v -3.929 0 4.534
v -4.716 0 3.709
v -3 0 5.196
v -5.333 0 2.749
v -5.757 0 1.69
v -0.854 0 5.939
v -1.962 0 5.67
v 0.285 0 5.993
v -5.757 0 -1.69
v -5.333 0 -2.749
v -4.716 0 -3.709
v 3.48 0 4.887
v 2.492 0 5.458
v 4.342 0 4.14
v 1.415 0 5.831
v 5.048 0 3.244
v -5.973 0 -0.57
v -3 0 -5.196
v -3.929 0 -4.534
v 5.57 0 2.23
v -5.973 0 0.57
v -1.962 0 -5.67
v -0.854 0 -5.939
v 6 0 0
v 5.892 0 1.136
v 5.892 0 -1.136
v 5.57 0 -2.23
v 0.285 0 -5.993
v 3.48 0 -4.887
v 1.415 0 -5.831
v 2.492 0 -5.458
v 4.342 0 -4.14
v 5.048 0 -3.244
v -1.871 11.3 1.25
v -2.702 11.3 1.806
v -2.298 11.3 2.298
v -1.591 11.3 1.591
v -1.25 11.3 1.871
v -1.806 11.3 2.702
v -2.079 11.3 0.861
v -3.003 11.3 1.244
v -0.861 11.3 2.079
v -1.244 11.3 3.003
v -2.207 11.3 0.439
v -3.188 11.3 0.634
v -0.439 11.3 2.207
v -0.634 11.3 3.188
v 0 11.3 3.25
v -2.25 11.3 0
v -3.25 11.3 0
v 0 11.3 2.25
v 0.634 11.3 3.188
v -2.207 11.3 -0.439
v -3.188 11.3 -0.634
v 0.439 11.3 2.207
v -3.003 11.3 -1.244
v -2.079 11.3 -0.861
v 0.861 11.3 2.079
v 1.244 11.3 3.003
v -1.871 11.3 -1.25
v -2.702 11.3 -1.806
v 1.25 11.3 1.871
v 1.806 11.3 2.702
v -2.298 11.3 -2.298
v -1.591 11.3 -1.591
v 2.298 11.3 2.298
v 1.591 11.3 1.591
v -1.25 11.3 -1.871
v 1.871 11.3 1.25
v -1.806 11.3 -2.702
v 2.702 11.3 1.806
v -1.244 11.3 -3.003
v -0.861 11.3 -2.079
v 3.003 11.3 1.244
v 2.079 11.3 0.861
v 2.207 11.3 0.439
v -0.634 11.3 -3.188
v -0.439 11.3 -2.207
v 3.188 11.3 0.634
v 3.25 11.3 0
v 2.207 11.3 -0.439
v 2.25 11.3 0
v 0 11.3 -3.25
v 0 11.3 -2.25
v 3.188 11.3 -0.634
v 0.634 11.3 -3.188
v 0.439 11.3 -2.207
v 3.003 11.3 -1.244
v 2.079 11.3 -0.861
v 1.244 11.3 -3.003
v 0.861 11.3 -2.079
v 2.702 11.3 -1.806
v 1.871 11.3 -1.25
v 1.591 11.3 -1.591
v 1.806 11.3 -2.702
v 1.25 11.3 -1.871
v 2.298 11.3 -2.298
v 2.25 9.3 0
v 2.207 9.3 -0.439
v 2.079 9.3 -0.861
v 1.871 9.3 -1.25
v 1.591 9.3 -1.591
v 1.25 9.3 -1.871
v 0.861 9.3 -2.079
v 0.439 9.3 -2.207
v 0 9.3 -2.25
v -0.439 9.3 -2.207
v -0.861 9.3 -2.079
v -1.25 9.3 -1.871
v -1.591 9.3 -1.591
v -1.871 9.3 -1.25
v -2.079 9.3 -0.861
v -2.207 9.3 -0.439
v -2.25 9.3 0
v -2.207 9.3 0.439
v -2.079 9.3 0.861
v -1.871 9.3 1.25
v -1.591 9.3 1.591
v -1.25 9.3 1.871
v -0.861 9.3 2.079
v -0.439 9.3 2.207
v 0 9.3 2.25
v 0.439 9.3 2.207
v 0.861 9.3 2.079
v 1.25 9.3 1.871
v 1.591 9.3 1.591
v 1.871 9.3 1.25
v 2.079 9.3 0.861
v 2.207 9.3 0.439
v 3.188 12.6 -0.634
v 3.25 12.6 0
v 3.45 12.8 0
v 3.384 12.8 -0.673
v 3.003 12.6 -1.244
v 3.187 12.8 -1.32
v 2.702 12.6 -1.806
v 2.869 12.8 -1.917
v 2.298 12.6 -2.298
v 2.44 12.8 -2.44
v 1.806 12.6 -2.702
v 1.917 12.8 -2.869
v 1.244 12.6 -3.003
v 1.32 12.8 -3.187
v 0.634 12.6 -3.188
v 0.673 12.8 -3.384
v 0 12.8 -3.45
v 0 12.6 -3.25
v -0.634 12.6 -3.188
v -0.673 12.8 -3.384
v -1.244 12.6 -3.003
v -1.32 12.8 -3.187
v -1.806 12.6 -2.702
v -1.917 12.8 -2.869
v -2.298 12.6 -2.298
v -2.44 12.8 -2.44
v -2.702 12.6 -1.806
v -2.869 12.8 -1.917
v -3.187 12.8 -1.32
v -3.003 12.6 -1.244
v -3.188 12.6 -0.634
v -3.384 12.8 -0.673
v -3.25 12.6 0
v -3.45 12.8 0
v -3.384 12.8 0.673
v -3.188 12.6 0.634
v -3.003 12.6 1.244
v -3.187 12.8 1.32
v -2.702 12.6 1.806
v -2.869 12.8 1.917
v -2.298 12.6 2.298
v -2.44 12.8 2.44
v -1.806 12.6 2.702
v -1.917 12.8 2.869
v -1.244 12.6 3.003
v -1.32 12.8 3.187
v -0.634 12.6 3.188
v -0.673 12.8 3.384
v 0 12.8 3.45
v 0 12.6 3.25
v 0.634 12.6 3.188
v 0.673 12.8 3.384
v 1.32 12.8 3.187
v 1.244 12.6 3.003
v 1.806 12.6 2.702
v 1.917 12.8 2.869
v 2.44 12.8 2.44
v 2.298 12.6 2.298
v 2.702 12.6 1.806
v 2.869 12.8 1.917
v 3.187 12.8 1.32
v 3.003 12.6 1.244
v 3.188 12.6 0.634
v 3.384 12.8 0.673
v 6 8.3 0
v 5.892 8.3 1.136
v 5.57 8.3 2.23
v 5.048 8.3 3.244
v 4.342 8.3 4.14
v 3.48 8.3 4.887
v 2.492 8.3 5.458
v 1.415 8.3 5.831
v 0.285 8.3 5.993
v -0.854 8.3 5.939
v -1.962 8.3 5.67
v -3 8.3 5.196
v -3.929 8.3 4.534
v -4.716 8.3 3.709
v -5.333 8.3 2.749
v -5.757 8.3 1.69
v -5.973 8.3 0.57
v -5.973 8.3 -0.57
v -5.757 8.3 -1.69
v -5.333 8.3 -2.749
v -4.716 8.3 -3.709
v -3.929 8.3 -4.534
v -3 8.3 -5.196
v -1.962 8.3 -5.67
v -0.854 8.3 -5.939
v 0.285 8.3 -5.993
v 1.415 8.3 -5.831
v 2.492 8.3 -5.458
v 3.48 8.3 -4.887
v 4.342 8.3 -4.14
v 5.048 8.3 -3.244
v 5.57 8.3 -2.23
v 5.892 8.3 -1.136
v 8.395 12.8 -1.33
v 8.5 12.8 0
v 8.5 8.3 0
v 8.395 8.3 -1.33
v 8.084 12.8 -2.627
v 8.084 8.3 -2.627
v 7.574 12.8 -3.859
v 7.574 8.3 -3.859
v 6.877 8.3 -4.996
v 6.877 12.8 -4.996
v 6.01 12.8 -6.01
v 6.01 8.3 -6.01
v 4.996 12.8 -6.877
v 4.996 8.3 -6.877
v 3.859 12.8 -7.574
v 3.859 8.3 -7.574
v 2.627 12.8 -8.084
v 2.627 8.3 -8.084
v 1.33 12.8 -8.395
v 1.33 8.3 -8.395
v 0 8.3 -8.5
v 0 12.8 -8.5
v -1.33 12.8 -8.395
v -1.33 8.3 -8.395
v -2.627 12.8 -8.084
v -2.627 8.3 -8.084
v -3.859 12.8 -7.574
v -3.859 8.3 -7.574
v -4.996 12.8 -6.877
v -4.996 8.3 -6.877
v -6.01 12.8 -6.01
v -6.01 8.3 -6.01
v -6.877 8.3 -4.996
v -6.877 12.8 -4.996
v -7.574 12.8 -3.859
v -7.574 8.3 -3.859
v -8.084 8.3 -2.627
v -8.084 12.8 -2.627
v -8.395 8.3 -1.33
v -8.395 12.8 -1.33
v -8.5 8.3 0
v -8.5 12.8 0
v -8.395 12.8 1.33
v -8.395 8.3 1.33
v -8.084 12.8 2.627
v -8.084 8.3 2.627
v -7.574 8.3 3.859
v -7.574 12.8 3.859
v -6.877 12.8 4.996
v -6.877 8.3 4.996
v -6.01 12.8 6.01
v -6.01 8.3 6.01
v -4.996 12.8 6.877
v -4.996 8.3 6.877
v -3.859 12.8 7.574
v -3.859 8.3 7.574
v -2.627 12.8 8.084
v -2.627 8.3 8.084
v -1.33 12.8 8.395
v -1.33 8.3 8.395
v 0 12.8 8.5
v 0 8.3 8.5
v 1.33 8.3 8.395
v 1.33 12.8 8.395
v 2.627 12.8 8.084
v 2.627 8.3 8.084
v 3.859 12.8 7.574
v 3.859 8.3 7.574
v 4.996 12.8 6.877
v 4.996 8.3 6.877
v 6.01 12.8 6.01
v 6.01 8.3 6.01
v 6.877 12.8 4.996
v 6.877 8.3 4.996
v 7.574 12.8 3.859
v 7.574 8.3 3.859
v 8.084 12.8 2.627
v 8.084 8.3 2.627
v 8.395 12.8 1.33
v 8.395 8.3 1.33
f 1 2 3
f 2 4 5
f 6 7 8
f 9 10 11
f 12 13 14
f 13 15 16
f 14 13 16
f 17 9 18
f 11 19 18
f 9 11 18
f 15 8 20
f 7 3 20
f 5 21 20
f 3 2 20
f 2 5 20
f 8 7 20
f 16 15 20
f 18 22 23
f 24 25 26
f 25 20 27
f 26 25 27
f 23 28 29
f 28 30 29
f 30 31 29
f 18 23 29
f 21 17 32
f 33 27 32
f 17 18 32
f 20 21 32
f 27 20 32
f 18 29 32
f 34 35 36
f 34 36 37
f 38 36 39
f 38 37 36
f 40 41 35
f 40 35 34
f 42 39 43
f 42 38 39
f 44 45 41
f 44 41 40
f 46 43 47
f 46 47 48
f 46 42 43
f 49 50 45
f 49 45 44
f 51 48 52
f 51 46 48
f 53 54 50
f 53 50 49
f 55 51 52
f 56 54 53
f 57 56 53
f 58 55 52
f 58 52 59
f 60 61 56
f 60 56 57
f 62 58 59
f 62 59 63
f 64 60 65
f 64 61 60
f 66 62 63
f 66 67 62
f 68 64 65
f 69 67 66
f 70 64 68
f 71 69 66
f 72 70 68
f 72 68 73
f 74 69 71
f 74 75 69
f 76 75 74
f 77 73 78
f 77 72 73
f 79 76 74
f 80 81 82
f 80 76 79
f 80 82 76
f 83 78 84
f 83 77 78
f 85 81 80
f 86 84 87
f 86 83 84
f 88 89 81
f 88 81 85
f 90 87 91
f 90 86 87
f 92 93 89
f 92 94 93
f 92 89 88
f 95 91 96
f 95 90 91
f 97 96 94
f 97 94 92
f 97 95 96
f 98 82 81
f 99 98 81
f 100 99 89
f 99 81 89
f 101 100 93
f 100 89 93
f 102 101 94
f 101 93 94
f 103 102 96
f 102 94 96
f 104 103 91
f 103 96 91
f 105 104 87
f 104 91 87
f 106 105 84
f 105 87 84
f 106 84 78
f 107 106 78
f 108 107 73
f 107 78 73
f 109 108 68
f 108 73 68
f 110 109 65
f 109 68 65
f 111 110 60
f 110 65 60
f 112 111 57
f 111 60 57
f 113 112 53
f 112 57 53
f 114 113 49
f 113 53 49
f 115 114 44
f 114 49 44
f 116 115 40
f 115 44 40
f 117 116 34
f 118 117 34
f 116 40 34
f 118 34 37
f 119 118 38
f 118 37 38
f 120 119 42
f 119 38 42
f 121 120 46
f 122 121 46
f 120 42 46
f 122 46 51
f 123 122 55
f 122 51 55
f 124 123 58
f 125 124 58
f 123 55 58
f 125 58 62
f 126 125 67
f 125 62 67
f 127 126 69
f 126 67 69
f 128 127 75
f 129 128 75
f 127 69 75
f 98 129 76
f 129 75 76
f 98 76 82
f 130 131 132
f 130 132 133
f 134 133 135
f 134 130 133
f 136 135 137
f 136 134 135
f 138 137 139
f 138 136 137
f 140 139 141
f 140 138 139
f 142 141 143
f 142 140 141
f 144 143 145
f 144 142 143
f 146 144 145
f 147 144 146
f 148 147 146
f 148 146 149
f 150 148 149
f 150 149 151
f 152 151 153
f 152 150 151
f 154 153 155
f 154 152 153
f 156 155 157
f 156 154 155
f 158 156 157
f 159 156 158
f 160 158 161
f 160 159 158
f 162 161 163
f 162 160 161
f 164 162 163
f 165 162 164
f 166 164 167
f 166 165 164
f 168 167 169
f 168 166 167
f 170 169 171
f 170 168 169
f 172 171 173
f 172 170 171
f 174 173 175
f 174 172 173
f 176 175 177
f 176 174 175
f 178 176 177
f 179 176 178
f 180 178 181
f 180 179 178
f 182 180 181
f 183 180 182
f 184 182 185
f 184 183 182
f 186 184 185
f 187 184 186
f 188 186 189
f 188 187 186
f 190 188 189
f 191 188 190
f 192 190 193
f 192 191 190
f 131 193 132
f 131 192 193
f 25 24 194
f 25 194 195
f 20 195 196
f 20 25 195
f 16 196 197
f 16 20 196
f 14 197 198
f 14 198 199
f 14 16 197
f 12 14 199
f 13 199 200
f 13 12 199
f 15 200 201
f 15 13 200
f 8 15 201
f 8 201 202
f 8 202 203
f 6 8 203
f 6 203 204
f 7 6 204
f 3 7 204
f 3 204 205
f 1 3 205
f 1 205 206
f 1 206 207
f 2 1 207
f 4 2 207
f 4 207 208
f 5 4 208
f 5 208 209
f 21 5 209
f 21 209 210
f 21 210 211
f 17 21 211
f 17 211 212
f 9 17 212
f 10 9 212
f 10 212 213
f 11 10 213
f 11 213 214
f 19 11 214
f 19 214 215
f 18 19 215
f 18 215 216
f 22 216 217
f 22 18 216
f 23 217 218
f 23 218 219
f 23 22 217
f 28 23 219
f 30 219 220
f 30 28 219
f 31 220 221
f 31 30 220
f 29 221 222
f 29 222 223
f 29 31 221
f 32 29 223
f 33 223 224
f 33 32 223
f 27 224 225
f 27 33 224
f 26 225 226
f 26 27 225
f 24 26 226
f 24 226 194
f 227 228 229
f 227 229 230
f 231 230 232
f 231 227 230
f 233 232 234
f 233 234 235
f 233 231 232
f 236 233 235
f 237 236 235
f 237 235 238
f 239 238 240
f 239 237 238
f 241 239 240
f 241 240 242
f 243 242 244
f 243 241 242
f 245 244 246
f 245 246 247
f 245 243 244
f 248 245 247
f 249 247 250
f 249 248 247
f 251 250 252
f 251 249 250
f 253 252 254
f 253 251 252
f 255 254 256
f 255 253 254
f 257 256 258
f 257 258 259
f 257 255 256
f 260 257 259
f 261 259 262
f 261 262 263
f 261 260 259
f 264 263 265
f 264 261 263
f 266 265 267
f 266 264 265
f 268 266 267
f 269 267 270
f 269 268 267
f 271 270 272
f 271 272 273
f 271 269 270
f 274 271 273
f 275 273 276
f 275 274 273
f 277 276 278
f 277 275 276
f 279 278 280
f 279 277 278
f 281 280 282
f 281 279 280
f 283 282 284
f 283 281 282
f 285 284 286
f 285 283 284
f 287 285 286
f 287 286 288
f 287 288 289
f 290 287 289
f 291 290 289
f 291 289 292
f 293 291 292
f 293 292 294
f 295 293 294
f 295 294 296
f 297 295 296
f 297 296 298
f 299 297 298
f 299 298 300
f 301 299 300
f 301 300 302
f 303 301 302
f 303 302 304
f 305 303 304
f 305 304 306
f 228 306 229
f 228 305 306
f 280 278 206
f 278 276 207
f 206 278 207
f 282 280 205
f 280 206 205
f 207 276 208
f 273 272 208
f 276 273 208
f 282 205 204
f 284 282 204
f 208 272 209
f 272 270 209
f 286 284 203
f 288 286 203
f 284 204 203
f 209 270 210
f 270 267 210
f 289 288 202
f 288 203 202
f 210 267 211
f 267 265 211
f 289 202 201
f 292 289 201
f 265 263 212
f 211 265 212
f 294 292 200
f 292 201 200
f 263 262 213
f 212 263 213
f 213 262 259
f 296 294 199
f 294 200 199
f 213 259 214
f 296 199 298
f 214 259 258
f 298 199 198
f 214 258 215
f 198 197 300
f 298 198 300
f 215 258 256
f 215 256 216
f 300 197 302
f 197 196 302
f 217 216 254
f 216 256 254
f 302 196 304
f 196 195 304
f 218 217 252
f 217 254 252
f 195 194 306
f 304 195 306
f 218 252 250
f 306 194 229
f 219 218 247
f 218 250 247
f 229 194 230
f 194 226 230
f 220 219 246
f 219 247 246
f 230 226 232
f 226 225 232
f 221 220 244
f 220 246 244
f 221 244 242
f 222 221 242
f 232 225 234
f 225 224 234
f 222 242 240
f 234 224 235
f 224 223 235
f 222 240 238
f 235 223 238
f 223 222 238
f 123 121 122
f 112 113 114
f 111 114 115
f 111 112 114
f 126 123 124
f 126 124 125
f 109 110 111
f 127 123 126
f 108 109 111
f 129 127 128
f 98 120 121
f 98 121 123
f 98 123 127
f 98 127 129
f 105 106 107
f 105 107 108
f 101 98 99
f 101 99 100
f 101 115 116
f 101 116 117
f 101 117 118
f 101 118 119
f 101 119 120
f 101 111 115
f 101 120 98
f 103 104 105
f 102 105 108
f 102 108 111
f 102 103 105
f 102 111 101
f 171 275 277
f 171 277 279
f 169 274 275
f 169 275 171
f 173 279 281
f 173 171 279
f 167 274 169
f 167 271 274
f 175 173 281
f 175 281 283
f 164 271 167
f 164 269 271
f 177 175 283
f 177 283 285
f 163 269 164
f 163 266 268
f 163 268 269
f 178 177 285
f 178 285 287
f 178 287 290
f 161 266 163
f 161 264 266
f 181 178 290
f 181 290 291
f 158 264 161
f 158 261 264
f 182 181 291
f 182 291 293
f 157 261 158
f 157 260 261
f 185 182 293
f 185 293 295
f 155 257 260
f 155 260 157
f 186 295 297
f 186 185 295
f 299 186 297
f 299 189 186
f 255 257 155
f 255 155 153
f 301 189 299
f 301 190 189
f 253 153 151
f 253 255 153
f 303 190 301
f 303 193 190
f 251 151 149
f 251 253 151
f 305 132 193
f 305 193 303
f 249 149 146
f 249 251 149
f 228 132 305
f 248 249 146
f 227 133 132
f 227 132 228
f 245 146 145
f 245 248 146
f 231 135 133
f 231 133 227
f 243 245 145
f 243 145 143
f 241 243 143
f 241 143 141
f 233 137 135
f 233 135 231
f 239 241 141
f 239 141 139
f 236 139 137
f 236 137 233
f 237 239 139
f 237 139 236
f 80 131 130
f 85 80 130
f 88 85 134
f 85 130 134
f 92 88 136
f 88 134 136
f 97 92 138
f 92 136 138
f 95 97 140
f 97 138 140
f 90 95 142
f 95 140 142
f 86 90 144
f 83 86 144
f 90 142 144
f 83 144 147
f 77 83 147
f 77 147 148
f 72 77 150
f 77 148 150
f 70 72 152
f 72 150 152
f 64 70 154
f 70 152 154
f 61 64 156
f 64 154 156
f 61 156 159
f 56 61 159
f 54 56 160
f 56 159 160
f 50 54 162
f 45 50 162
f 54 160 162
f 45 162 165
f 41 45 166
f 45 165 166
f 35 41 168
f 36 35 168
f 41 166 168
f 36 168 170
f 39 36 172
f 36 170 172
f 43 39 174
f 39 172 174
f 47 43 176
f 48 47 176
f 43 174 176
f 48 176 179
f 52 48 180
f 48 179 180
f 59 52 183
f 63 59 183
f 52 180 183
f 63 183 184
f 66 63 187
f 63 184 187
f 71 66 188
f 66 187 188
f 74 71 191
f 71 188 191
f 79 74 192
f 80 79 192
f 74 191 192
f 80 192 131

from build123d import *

# Parameters (mm, degrees)
SKETCH1_R           = 7
BOSS_EXTRUDE1_DEPTH = 12.8
SKETCH2_OUTSIDE_W   = 20.716
SKETCH2_OUTSIDE_H   = 20.716
SKETCH2_OUTSIDE_R   = 6
CUT_EXTRUDE1_DEPTH  = 13.8
SKETCH3_R           = 3.25
CUT_EXTRUDE2_DEPTH  = 1.5
SKETCH4_R           = 2.25
CUT_EXTRUDE3_DEPTH  = 2
CHAMFER1_SIZE       = 0.2
SKETCH_1_R          = 8.5
SKETCH_1_R_2        = 5.212411732
EXTRUDE_1_DEPTH     = 4.5


with BuildPart() as part:
    # Sketch1 → Boss-Extrude1 (new body)
    with BuildSketch(Plane(origin=(0, 0, 0), x_dir=(1, 0, 0), z_dir=(0, 1, 0))):
        Circle(SKETCH1_R)
    extrude(amount=BOSS_EXTRUDE1_DEPTH)

    # Sketch2 outside → Cut-Extrude1 (cut, through all)
    with BuildSketch(Plane.XZ):
        Rectangle(SKETCH2_OUTSIDE_W, SKETCH2_OUTSIDE_H)
        Circle(SKETCH2_OUTSIDE_R, mode=Mode.SUBTRACT)
    extrude(amount=-CUT_EXTRUDE1_DEPTH, mode=Mode.SUBTRACT)

    # Sketch3 → Cut-Extrude2 (cut)
    with BuildSketch(Plane(origin=(0, 12.8, 0), x_dir=(1, 0, 0), z_dir=(0, 1, 0))):
        Circle(SKETCH3_R)
    extrude(amount=-CUT_EXTRUDE2_DEPTH, mode=Mode.SUBTRACT)

    # Sketch4 → Cut-Extrude3 (cut)
    with BuildSketch(Plane(origin=(0, 11.3, 0), x_dir=(1, 0, 0), z_dir=(0, 1, 0))):
        Circle(SKETCH4_R)
    extrude(amount=-CUT_EXTRUDE3_DEPTH, mode=Mode.SUBTRACT)

    # Chamfer1
    chamfer1_edges = [part.edges().sort_by_distance(p)[0] for p in [
        (-3.25, 12.8, 0),
    ]]
    chamfer(chamfer1_edges, length=CHAMFER1_SIZE)

    # ｽｹｯﾁ1 → ﾎﾞｽ - 押し出し1 (add)
    with BuildSketch(Plane(origin=(0, 12.8, 0), x_dir=(1, 0, 0), z_dir=(0, 1, 0))):
        Circle(SKETCH_1_R)
        Circle(SKETCH_1_R_2, mode=Mode.SUBTRACT)
    extrude(amount=-EXTRUDE_1_DEPTH)


solid = part.part
